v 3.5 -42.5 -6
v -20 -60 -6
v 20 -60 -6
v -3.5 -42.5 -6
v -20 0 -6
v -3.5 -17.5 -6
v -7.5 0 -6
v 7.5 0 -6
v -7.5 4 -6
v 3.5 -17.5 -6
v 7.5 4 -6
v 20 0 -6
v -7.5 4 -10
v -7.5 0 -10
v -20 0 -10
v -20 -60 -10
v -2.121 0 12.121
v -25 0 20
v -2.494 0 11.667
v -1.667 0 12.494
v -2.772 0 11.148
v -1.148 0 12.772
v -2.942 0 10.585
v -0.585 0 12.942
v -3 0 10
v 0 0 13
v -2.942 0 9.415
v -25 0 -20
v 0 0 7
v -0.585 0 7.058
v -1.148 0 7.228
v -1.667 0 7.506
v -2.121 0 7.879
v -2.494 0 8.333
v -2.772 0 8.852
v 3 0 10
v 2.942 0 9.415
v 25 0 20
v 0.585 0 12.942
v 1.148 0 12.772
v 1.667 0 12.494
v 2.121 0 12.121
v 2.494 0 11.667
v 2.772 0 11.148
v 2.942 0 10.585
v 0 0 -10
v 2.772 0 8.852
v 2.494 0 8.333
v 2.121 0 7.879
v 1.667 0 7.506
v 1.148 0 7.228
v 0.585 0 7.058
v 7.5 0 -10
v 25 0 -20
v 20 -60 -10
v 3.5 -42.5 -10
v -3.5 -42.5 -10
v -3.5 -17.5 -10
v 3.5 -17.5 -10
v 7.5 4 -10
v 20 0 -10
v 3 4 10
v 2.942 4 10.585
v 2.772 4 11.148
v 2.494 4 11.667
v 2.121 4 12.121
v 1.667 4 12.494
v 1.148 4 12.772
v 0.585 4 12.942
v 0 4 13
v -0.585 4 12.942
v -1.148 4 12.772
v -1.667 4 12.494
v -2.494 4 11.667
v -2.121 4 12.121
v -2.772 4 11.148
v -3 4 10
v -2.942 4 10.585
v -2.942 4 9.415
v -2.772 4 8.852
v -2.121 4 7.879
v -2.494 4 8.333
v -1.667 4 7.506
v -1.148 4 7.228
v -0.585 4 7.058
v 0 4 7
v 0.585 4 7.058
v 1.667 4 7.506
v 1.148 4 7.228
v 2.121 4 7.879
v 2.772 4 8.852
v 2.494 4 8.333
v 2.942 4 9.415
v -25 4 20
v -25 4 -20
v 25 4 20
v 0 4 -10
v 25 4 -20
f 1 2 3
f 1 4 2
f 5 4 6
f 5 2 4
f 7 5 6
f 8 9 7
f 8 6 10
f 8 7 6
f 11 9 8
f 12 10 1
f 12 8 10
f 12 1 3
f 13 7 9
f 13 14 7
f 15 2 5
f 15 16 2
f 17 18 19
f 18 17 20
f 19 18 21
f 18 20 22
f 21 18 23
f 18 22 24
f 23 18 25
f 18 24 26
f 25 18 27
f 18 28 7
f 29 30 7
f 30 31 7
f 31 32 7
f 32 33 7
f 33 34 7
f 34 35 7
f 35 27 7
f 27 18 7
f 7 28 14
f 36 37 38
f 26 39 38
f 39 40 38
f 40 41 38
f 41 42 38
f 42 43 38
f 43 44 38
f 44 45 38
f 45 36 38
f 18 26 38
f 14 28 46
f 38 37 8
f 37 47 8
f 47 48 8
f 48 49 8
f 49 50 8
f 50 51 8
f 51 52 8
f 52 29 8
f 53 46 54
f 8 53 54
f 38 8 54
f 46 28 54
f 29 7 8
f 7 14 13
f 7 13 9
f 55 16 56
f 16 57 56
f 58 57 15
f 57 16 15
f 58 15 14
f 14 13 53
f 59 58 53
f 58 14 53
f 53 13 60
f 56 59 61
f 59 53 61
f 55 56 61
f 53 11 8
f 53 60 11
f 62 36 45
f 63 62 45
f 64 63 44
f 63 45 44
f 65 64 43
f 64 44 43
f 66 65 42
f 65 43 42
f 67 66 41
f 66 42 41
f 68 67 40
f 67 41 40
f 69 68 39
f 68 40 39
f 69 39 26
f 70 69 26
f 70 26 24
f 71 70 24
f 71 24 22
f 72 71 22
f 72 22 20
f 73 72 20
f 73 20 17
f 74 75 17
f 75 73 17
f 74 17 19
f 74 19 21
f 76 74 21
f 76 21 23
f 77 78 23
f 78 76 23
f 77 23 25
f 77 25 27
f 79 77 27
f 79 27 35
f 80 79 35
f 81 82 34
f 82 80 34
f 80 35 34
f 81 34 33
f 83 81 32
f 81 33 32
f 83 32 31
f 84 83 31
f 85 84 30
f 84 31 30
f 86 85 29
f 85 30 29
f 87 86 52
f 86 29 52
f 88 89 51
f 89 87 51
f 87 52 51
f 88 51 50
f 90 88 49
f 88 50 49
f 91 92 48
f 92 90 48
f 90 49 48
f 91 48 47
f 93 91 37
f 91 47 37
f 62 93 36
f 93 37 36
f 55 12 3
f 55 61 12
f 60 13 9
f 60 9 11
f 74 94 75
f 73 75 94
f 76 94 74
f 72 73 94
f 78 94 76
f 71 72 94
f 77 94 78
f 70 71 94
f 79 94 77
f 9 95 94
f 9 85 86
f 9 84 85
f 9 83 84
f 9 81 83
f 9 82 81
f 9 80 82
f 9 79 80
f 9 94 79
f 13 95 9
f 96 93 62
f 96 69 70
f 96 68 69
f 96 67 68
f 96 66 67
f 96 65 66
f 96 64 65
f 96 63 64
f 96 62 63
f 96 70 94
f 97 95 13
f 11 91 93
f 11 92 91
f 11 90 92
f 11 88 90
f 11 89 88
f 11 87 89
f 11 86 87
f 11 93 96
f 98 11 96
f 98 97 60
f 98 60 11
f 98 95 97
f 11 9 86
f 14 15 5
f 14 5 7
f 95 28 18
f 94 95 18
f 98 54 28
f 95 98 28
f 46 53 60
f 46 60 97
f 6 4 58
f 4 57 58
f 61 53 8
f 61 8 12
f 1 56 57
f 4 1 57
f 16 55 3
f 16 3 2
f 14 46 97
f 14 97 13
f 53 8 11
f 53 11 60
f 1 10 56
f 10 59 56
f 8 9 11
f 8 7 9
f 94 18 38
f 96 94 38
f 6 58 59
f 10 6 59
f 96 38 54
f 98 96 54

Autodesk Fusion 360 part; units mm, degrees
sketch "Sketch1" plane through (0, 0, 0) normal (0, 1, 0) x (1, 0, 0)
  line L0 (25, 20) -> (-25, 20)
  line L1 (-25, 20) -> (-25, -20)
  line L2 (-25, -20) -> (25, -20)
  line L3 (25, -20) -> (25, 20)
  circle A0 centre (0, -10) radius 3
  line L4 (0, 10) -> (-7.5, 10)
  line L5 (-7.5, 10) -> (-7.5, 6)
  line L6 (-7.5, 6) -> (7.5, 6)
  line L7 (7.5, 6) -> (7.5, 10)
  line L8 (7.5, 10) -> (0, 10)
  dimension "d1" = 50
  dimension "d2" = 40
  dimension "d3" = 6
  dimension "d4" = 7.5
  dimension "d5" = 4
  dimension "d6" = 15
extrude "Extrude1" add sketch "Sketch1" along normal blind 4 makes body 1
sketch "Sketch2" plane through (0, 0, 0) normal (0, 0, 1) x (1, 0, 0)
  line L0 (170, -30) -> (130, -30)
  line L1 (130, -30) -> (130, 30)
  line L2 (170, 30) -> (170, -30)
  line L3 (170, -30) -> (130, 30) construction
  line L4 (130, -30) -> (170, 30) construction
  line L5 (153.5, -12.5) -> (146.5, -12.5)
  line L6 (146.5, -12.5) -> (146.5, 12.5)
  line L7 (146.5, 12.5) -> (153.5, 12.5)
  line L8 (153.5, 12.5) -> (153.5, -12.5)
  line L9 (153.5, -12.5) -> (146.5, 12.5) construction
  line L10 (146.5, -12.5) -> (153.5, 12.5) construction
  line L11 (142.5, 30) -> (142.5, 34)
  line L12 (142.5, 34) -> (157.5, 34)
  line L13 (157.5, 34) -> (157.5, 30)
  line L14 (130, 30) -> (142.5, 30)
  line L15 (157.5, 30) -> (170, 30)
  point P0 (150, 0)
  point P1 (150, 0)
  dimension "d9" = 40
  dimension "d10" = 60
  dimension "d11" = 7
  dimension "d12" = 25
  dimension "d14" = 4
  dimension "d15" = 15
extrude "Extrude2" add sketch "Sketch2" along normal blind 4 separate body makes body 2
copy_body "Body->Comp1" bodies 2 removing the originals makes body 3 in component "Component"
component "Component" placed x (1, 0, 0) y (0, 1, 0) z (0, 0, 1) at (-150, -30, -10)
